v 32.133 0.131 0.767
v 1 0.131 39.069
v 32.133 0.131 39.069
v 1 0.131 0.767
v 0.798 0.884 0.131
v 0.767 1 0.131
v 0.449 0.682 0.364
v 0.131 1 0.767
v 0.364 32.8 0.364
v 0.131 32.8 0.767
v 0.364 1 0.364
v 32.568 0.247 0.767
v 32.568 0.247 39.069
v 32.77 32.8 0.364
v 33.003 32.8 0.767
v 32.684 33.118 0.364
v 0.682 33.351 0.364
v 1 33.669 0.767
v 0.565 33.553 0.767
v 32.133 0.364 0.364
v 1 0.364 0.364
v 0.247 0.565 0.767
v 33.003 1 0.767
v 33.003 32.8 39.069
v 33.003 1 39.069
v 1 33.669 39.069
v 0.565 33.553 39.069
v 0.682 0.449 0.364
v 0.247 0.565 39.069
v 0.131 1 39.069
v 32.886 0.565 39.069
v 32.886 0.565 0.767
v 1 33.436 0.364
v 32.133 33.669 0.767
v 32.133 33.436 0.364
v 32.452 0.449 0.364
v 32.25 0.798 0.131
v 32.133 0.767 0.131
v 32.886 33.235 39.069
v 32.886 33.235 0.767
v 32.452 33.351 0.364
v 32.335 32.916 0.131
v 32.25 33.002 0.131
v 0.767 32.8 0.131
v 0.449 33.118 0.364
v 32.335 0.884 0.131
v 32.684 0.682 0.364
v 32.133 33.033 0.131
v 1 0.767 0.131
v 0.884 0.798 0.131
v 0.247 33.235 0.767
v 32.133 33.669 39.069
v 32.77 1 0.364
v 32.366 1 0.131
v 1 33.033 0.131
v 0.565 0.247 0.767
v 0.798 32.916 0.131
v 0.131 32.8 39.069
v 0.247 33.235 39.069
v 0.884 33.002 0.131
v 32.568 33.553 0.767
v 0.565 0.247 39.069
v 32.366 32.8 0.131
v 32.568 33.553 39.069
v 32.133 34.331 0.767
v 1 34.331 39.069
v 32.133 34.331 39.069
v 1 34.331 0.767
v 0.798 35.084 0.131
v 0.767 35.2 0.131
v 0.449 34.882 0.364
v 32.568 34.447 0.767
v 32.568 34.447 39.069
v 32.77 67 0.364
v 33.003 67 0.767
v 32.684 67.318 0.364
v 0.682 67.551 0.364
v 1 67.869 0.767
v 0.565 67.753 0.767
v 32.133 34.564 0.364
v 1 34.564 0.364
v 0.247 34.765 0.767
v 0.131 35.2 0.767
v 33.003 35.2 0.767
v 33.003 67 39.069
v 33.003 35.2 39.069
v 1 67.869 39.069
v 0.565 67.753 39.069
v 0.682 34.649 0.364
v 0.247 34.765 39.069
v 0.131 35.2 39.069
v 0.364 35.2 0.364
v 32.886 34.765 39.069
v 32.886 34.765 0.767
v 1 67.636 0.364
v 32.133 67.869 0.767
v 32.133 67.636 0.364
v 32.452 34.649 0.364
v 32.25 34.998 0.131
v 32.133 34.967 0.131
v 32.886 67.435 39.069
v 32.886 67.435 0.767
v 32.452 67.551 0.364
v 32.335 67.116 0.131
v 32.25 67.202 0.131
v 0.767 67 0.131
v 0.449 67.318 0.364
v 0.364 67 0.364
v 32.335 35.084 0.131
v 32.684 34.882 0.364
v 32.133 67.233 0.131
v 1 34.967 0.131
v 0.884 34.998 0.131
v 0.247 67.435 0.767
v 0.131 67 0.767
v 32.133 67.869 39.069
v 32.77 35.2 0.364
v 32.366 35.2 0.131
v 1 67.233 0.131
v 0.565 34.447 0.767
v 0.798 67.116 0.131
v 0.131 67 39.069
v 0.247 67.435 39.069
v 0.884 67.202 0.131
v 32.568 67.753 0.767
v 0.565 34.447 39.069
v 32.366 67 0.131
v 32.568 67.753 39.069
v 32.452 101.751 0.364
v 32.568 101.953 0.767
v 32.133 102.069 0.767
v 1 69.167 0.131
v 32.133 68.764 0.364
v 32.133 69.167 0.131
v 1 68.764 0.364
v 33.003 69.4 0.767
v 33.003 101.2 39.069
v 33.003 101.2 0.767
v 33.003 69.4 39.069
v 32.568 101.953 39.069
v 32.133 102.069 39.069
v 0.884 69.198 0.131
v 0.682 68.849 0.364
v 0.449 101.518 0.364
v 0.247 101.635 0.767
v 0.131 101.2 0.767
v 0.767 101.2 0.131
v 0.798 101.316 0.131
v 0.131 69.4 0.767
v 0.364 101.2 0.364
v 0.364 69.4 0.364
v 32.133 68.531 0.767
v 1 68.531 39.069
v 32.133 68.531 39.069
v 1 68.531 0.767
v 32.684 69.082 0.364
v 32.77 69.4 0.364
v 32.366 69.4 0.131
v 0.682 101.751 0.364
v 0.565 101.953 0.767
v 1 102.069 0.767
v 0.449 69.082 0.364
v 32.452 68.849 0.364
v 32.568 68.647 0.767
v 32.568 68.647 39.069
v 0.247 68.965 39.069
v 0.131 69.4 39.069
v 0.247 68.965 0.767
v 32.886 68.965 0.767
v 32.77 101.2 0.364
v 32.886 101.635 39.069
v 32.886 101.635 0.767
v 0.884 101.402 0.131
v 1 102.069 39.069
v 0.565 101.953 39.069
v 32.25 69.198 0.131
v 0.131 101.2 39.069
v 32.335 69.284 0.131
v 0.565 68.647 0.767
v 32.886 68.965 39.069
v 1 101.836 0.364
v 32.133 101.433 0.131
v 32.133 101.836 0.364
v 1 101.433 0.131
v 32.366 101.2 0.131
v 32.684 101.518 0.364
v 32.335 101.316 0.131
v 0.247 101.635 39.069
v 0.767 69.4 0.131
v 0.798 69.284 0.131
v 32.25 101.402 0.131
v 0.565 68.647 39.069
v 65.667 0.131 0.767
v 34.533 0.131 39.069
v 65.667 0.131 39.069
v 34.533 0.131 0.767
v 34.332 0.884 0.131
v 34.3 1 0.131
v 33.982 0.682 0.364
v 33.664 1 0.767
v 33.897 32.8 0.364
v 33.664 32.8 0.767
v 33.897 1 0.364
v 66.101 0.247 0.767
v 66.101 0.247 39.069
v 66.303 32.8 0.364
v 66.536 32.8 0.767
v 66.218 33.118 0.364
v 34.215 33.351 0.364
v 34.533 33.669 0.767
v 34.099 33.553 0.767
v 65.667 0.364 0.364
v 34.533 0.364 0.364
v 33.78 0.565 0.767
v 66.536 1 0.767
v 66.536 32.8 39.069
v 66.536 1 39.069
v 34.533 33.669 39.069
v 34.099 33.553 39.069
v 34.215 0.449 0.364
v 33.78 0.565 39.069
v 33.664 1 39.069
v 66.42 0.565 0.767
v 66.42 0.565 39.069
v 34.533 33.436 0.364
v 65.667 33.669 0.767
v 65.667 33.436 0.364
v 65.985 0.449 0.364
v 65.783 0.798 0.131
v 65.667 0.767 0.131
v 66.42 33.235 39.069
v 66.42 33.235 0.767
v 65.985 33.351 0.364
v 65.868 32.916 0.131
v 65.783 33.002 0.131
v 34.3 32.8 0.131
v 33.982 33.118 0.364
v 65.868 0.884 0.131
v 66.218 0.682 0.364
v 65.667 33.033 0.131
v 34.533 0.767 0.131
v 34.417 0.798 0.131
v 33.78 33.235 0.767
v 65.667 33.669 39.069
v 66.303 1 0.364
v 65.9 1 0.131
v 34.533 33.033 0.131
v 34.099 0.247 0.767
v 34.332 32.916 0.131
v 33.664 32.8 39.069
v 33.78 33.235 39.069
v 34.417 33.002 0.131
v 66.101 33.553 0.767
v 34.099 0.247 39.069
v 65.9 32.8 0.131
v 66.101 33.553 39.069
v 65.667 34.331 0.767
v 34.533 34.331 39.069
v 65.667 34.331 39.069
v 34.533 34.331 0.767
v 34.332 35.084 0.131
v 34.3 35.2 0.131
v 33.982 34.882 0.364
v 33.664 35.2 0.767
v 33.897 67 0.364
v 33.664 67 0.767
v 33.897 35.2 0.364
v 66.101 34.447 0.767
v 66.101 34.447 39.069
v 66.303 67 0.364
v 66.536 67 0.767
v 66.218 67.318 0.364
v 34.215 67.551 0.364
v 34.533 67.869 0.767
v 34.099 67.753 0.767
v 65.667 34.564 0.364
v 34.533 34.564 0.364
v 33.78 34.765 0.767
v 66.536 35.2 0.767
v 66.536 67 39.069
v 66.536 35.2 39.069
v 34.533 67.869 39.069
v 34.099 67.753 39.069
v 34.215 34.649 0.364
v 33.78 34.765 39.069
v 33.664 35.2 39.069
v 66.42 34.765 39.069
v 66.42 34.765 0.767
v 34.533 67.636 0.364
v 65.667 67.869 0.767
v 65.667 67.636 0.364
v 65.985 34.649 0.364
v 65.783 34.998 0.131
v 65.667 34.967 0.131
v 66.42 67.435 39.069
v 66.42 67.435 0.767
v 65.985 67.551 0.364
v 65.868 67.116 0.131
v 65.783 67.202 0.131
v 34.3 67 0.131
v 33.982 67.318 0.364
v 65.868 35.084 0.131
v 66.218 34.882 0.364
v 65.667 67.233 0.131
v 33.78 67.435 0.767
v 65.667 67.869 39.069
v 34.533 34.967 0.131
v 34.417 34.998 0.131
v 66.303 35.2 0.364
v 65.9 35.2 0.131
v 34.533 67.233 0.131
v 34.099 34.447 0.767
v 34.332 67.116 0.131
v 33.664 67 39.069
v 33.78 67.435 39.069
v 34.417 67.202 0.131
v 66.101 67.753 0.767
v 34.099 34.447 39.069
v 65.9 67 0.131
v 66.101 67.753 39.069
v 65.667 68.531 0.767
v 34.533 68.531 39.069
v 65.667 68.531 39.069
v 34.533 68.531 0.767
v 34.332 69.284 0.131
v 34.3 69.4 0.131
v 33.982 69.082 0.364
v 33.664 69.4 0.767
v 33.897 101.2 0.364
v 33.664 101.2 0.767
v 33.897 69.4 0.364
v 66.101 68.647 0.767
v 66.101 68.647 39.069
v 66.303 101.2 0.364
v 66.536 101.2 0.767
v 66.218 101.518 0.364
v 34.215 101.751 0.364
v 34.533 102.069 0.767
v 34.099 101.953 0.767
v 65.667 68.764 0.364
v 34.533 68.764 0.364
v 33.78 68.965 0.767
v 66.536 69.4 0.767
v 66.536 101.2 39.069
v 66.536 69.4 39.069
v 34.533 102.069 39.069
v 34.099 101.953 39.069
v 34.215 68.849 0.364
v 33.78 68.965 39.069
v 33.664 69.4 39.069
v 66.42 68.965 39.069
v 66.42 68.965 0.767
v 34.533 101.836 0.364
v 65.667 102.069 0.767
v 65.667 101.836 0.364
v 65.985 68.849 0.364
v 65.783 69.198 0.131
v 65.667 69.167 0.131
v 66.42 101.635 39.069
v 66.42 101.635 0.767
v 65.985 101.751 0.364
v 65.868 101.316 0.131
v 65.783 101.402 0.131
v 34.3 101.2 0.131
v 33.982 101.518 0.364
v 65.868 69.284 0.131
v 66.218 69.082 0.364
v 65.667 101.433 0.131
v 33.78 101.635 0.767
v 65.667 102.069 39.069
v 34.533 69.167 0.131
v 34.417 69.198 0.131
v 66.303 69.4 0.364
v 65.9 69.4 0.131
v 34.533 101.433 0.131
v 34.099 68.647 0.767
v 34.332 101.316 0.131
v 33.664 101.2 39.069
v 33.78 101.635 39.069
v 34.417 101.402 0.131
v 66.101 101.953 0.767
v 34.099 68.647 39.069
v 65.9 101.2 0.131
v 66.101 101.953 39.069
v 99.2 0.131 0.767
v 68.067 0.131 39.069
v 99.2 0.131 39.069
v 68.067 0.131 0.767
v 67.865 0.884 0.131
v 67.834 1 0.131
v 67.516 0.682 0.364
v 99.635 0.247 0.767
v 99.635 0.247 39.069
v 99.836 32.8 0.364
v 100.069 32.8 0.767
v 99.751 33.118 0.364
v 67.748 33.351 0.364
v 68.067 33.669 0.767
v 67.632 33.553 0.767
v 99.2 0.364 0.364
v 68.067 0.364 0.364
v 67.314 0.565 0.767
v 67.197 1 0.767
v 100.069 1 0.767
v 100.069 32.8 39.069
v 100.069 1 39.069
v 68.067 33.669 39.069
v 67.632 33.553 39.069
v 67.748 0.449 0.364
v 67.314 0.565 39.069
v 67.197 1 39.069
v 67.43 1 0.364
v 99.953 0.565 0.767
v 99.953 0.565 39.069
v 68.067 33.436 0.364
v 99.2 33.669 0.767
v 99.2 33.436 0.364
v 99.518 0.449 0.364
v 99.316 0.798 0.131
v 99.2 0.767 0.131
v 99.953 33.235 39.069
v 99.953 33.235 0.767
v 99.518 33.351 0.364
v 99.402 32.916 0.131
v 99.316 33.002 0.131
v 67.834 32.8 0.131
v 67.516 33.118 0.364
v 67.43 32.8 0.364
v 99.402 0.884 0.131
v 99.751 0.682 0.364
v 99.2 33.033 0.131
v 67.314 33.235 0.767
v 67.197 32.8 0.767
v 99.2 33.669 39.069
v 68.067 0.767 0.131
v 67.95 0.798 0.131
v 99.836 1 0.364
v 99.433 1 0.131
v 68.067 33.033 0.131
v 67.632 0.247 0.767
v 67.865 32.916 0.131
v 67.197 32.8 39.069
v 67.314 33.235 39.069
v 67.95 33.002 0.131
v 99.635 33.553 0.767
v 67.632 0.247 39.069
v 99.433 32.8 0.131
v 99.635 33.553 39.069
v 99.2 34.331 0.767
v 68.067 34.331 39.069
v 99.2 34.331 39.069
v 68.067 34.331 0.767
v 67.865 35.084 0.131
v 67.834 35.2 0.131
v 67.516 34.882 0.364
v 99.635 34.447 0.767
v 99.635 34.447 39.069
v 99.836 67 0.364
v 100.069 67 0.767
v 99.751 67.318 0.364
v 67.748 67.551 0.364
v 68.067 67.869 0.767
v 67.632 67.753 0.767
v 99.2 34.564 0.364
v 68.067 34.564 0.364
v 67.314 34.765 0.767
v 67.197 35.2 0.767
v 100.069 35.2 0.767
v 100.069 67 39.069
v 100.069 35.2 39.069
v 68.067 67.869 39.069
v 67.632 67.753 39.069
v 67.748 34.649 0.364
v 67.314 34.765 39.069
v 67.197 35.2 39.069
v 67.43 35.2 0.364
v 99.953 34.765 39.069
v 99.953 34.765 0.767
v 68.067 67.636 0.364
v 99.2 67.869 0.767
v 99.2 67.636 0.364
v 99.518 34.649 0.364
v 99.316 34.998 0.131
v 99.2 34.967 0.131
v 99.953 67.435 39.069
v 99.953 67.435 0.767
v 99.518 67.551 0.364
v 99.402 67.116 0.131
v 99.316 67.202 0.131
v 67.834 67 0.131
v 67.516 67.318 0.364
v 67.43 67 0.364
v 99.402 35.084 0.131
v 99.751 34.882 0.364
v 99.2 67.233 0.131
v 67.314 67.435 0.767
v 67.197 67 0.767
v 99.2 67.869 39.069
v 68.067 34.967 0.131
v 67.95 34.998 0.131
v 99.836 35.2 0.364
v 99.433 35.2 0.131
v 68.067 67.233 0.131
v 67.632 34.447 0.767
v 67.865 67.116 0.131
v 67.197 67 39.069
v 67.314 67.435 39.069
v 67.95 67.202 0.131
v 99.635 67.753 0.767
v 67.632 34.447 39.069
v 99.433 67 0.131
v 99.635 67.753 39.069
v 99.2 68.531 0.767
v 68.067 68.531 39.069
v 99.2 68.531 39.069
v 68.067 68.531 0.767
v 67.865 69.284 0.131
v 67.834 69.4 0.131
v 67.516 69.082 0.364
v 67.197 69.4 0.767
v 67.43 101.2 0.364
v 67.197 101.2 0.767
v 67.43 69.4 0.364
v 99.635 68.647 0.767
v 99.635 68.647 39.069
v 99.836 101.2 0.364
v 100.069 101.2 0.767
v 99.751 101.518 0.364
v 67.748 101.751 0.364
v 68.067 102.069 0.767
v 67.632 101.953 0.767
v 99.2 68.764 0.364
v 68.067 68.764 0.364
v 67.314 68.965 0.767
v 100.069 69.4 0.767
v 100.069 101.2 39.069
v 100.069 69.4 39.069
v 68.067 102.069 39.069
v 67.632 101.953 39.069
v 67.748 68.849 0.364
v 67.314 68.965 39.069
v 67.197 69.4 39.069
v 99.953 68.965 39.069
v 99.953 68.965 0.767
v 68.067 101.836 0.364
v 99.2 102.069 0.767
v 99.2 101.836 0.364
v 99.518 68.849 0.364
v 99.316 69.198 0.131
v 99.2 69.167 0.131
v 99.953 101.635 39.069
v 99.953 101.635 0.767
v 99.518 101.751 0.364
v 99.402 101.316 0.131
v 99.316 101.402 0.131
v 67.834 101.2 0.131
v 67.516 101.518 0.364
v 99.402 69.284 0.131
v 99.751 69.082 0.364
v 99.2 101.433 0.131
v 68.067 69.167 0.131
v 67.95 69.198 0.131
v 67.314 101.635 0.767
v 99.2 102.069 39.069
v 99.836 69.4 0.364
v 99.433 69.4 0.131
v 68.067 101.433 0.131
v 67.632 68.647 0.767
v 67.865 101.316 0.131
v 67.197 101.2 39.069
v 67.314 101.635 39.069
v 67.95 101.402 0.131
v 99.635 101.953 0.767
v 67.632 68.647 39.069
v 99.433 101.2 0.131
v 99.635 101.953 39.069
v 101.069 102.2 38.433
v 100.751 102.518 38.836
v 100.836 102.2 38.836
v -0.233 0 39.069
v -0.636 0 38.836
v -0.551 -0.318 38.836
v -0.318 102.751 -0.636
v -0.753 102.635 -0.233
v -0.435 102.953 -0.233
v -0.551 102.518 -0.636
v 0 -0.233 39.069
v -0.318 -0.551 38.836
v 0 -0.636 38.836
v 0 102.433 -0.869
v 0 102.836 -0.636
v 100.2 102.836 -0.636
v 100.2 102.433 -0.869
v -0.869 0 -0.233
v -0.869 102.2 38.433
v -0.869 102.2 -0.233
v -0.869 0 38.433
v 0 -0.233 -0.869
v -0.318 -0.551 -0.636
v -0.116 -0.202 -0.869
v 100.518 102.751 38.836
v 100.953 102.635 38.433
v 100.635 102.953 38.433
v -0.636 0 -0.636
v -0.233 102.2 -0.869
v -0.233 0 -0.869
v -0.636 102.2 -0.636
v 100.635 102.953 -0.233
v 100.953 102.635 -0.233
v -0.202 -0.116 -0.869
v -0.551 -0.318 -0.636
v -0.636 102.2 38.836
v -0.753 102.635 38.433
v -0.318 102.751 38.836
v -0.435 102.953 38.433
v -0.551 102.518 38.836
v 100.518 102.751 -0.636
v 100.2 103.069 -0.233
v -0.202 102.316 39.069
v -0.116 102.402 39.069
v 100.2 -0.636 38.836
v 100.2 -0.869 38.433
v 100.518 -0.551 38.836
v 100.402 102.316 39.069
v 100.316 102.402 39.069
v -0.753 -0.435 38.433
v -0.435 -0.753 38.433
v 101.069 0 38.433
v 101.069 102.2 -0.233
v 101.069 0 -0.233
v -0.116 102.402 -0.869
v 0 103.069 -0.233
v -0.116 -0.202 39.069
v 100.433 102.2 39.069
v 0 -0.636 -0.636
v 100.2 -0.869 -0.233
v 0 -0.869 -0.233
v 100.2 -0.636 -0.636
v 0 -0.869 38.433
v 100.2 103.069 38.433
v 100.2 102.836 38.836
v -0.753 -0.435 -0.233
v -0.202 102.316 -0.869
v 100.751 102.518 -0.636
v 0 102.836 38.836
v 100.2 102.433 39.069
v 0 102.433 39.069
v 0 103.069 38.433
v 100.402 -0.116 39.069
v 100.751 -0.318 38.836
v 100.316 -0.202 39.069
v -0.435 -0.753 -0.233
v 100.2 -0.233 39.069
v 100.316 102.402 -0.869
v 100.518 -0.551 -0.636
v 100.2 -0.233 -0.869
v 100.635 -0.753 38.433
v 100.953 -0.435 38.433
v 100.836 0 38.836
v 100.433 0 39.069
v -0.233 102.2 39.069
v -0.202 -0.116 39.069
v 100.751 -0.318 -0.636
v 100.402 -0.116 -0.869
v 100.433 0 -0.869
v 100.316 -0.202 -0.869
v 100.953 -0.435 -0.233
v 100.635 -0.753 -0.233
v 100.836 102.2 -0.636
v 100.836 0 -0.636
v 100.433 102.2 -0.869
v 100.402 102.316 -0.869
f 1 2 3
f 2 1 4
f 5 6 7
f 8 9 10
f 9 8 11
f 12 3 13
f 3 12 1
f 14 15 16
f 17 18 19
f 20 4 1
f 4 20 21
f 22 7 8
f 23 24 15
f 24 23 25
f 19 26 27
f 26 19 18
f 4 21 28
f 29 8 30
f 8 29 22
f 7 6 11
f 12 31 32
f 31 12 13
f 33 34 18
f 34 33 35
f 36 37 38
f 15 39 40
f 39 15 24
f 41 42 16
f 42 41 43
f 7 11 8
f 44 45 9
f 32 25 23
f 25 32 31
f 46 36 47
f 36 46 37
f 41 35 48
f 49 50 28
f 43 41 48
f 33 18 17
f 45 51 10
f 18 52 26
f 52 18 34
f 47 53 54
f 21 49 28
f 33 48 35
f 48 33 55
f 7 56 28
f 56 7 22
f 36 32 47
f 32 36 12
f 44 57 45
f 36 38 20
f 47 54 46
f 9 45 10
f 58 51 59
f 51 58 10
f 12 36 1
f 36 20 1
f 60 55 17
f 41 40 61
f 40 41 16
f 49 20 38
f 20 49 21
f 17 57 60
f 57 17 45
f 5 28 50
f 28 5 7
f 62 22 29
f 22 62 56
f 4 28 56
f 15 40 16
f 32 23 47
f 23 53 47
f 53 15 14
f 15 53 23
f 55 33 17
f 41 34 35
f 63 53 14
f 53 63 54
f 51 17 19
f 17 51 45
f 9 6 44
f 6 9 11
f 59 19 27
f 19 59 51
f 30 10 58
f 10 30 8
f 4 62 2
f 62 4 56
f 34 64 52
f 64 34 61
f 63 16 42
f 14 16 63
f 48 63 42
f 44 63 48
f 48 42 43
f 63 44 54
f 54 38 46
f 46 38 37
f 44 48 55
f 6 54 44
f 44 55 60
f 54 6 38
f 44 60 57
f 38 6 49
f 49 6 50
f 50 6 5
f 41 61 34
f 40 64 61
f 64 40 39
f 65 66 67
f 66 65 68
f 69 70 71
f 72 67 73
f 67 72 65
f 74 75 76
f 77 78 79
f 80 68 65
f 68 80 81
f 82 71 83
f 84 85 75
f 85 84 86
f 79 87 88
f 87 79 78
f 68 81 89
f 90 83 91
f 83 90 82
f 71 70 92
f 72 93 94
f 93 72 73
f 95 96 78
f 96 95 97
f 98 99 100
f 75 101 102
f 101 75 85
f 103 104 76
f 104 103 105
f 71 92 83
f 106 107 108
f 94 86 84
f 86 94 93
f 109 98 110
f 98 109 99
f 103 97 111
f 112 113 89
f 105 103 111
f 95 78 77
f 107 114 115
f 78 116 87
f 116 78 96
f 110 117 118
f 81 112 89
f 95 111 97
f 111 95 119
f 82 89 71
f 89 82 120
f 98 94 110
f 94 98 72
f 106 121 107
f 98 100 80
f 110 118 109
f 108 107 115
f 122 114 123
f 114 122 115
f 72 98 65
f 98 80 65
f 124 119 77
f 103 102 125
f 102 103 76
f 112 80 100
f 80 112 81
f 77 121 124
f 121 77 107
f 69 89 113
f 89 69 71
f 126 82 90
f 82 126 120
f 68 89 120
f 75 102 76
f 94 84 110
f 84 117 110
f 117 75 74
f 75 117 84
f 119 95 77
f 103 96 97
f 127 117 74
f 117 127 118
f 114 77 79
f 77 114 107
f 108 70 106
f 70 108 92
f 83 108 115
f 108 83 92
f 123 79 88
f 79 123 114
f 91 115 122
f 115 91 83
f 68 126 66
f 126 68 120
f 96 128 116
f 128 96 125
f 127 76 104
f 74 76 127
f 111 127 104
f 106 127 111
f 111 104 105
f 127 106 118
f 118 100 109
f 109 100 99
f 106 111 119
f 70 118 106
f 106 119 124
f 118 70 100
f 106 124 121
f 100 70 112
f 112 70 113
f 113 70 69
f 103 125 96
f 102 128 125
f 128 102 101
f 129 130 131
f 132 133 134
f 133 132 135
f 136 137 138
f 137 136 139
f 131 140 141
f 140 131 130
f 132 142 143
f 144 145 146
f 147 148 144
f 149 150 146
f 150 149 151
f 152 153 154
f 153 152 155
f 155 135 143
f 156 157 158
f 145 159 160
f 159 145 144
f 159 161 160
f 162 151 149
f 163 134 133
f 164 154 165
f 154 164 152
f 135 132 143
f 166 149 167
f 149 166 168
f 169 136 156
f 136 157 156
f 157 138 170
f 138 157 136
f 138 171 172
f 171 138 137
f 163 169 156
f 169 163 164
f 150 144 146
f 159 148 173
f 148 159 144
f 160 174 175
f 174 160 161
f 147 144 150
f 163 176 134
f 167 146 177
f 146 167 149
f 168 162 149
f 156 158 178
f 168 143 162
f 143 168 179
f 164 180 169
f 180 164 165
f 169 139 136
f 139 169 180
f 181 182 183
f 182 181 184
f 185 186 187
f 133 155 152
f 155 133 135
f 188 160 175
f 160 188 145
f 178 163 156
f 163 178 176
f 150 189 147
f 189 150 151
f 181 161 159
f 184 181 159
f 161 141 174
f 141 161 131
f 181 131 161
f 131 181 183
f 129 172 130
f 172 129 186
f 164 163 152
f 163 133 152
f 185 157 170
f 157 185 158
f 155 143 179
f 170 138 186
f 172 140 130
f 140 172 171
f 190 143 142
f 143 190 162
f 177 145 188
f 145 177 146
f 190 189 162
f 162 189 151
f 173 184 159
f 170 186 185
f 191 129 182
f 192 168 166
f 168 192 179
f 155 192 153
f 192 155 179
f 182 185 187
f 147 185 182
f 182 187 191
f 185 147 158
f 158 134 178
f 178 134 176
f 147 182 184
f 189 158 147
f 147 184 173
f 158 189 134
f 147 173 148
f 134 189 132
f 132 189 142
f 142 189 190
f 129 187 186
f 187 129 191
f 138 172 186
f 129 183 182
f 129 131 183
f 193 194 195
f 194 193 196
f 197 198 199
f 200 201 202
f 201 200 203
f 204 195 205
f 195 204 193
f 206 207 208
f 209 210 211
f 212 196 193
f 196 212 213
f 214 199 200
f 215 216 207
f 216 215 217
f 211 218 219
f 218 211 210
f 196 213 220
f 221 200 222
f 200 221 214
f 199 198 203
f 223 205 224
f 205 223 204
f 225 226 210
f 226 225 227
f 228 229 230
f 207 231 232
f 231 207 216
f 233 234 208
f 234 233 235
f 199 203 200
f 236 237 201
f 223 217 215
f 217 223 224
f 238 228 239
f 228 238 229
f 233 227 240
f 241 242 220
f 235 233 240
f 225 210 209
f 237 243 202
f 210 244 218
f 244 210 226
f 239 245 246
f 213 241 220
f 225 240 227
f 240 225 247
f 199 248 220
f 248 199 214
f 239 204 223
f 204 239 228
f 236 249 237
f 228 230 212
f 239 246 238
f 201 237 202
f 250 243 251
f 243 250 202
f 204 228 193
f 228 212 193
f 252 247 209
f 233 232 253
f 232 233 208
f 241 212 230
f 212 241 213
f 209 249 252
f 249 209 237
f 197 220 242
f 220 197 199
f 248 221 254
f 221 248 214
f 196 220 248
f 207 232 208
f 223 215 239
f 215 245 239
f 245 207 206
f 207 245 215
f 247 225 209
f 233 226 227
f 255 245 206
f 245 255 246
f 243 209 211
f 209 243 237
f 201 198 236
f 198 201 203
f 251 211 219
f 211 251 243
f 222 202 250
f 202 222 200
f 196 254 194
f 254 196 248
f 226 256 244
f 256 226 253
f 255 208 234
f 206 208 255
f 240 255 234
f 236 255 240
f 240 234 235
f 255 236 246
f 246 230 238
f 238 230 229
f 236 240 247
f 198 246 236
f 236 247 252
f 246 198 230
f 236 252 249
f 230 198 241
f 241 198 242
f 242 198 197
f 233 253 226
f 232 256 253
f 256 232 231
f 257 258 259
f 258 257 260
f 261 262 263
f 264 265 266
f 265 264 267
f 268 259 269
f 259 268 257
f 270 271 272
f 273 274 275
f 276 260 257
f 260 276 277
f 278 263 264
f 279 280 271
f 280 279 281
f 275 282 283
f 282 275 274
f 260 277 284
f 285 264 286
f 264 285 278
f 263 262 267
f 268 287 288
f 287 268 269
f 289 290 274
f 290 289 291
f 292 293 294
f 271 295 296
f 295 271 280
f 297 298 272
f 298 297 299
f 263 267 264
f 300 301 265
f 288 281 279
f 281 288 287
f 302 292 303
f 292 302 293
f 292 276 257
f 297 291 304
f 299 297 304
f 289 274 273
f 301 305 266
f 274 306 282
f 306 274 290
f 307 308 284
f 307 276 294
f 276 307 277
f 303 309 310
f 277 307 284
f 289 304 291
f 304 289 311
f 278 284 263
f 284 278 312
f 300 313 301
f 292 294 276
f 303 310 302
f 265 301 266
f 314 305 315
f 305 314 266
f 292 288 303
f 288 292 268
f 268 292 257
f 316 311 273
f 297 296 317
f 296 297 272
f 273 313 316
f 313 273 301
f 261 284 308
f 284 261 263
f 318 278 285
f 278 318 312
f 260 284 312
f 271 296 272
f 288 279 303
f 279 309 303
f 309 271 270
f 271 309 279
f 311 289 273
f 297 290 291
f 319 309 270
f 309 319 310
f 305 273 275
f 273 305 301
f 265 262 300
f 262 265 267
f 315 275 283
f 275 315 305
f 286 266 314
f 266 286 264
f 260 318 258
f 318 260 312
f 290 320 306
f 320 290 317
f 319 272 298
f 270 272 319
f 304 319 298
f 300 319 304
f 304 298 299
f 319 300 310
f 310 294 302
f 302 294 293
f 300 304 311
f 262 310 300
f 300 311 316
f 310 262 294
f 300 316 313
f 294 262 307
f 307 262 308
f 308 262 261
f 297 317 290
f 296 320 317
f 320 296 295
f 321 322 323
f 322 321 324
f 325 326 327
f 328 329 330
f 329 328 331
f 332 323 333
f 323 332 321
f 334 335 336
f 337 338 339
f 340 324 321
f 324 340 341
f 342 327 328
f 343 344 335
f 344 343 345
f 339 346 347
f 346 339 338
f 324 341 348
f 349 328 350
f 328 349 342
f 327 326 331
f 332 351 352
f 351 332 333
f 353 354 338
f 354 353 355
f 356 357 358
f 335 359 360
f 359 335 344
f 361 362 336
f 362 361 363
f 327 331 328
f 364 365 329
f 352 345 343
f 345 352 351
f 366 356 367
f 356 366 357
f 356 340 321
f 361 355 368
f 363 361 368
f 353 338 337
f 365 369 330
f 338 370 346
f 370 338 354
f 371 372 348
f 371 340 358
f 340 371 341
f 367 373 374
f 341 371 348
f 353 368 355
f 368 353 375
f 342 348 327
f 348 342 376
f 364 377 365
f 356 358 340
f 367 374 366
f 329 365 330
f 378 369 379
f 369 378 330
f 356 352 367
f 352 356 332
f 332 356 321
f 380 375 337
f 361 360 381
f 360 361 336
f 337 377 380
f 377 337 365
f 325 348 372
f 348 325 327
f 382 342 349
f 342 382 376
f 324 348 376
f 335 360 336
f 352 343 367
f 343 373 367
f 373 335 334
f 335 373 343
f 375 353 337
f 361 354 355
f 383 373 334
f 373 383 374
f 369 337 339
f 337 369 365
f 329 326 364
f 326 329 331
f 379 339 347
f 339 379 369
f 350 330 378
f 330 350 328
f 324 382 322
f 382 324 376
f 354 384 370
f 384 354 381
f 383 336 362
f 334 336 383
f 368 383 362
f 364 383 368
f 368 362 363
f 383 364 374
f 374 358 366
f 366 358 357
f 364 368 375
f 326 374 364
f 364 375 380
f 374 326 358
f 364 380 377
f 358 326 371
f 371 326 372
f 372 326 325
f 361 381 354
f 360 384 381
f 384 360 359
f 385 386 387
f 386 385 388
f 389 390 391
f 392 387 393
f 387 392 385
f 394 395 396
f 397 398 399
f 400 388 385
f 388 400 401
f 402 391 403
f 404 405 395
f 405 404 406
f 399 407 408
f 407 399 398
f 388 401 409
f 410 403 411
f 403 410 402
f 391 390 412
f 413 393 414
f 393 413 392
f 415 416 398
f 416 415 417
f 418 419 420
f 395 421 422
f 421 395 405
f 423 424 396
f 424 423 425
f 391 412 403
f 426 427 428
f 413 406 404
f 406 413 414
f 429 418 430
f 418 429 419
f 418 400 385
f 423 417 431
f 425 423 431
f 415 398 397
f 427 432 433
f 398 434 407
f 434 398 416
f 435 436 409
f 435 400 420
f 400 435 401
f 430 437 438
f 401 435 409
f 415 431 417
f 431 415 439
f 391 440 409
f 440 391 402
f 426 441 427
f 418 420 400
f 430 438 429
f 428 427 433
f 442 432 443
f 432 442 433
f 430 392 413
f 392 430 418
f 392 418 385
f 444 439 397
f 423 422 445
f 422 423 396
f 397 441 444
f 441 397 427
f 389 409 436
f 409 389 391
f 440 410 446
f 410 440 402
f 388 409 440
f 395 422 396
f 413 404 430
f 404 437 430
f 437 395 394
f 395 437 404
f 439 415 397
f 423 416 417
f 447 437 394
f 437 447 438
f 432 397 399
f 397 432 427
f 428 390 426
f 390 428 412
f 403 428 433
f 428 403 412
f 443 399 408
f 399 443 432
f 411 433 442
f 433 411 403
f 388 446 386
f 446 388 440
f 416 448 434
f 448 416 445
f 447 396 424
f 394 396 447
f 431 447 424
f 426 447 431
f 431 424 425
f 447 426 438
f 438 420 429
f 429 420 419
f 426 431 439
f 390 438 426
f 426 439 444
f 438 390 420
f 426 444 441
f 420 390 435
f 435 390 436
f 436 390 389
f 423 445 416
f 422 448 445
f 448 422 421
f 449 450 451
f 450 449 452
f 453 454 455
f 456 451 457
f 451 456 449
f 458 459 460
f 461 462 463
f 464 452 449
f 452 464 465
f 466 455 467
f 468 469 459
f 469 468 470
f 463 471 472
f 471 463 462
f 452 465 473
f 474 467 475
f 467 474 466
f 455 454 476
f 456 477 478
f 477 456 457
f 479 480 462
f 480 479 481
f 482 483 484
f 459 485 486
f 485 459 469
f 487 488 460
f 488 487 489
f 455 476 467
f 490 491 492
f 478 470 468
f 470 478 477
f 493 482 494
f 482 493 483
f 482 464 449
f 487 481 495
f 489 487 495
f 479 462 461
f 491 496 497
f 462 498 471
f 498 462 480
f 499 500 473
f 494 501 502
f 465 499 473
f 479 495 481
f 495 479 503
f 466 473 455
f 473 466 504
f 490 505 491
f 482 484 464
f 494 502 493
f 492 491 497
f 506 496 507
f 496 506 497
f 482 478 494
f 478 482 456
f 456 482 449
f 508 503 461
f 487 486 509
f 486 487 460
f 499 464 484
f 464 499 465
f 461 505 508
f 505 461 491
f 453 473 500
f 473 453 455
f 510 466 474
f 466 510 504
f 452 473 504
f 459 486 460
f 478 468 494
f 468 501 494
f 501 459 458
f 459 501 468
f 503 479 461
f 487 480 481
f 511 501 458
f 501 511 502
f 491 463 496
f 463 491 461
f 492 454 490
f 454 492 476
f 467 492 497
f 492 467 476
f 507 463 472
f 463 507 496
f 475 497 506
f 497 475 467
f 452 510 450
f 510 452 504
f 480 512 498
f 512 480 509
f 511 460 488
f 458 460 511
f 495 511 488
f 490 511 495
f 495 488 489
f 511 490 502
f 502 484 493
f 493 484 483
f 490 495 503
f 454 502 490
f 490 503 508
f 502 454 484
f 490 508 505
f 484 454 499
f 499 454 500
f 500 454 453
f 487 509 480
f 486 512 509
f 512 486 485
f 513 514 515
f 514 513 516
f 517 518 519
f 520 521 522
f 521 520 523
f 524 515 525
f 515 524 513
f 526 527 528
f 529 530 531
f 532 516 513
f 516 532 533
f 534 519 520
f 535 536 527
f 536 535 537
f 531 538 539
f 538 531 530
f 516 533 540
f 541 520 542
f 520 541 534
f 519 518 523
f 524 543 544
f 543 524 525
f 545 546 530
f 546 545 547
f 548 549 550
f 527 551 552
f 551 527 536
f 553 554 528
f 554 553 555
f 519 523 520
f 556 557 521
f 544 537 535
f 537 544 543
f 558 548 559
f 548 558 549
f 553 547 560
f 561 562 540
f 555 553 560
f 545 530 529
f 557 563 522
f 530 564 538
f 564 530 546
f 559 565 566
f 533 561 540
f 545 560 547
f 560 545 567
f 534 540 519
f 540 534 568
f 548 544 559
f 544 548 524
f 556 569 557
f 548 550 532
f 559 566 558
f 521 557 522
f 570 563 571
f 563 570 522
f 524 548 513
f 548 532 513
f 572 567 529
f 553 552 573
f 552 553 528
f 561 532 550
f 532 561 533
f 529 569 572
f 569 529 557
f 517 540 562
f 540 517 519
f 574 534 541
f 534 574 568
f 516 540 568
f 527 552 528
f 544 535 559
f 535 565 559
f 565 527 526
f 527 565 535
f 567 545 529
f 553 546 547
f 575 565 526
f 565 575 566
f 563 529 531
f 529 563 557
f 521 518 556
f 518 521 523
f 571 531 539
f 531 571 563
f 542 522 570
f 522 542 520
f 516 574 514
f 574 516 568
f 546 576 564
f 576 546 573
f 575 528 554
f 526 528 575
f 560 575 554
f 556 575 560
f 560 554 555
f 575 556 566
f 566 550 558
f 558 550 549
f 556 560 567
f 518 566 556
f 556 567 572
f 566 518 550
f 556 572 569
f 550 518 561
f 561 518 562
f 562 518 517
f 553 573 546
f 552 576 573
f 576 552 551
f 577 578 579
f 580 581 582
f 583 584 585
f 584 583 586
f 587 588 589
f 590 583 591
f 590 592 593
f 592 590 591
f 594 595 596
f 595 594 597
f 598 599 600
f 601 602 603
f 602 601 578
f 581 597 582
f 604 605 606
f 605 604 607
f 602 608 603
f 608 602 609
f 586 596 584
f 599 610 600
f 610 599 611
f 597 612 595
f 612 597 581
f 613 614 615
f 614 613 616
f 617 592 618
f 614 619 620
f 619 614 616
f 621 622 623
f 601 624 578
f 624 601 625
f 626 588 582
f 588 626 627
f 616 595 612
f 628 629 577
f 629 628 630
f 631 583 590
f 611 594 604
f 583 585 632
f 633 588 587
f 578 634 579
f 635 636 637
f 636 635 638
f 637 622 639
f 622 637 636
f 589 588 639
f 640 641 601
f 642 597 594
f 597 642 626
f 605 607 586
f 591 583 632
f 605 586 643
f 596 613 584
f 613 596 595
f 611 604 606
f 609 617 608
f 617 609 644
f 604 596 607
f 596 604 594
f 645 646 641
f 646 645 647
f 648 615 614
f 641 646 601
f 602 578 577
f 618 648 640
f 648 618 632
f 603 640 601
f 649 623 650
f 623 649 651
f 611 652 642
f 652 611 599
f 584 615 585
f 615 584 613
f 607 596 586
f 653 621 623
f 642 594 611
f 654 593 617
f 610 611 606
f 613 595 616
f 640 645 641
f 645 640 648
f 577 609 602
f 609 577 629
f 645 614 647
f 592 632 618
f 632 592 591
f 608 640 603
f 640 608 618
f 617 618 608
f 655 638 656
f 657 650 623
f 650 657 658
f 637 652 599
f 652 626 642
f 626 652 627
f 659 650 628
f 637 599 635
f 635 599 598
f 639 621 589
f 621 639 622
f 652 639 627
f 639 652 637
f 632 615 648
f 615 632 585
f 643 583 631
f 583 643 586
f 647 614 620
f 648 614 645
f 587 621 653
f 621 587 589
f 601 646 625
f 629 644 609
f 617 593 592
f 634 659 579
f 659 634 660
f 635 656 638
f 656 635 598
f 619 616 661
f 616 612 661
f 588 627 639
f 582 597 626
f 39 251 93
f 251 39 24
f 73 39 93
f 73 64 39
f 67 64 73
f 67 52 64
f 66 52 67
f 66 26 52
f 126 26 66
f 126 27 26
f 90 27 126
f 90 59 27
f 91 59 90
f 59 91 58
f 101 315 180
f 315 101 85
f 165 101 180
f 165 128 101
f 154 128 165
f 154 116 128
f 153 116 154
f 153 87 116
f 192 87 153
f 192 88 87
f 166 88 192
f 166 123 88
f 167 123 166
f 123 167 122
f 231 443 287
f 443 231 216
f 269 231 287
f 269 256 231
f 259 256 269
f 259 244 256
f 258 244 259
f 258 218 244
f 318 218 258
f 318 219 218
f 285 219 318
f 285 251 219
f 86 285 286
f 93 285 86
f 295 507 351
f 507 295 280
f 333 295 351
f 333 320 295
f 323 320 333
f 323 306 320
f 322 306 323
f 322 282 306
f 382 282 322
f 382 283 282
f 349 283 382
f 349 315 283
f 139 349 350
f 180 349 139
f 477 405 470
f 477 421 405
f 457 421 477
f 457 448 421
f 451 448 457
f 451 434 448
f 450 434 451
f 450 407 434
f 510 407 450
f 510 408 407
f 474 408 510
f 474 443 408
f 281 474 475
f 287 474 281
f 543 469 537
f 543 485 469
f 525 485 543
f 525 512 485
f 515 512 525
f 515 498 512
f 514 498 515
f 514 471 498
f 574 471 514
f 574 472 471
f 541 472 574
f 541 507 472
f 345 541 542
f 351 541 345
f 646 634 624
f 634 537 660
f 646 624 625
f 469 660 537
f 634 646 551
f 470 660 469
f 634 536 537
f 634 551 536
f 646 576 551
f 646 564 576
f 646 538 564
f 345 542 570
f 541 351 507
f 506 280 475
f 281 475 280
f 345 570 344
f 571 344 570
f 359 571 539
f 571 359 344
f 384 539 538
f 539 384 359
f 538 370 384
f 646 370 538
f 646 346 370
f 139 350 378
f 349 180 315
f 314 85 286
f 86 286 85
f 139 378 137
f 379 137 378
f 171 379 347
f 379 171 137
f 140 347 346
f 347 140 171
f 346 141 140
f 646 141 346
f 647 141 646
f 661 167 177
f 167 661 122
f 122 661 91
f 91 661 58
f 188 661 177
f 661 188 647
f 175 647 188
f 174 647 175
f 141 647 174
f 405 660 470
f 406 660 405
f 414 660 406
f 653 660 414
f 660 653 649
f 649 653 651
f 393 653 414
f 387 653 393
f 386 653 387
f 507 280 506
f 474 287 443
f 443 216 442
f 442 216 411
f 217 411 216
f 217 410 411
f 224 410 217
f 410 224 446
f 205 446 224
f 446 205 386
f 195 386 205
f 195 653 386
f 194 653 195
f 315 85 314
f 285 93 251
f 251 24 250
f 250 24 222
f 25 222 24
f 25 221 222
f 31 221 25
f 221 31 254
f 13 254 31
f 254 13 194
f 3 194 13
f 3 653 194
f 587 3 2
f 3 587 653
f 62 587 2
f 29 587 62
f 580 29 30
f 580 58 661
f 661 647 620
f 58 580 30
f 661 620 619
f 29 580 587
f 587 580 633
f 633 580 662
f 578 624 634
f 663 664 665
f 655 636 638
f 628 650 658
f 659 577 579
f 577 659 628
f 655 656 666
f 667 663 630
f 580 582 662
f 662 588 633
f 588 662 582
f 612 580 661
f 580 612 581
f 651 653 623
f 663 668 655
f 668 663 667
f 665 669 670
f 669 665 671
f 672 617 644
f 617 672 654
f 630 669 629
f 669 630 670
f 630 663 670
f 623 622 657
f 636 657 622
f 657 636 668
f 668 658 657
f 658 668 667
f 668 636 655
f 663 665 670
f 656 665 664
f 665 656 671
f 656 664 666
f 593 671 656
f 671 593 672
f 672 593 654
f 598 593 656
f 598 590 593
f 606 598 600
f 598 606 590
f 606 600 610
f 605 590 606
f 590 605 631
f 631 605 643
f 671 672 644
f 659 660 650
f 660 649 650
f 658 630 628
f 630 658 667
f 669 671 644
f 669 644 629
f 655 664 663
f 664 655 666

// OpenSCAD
/////////////////Parameters
/* [Sizes] */
// total width
tw =102;
// total length
tl = 104;
// height
owh = 40;
// boxes in width direction
nw=3; // [1:10]
// boxes in length direction
nl=3; // [1:10]
// outer wall width
oww = 1;
// inner wall width 
iww = 0.6;
// edge radius
r = 0.9;
/* [Hidden] */
$fn=12;
//drawing

if (r<=0) {
	boxes(nw,nl,oww,iww,owh,(tw-2*oww+iww)/nw,(tl-2*oww+iww)/nl);
} else {
	rboxes(nw,nl,oww,iww,owh,(tw-2*oww+iww)/nw,(tl-2*oww+iww)/nl,r);
}

//////////////////Calculations + modules

module boxes(nbw,nbl,ow,iw,oh,boxw,boxl) {
	difference() {
		cube([nbw*boxw+ow+ow-iw,nbl*boxl+ow+ow-iw,oh]);
		for (i=[0:nbw-1])
			for (j=[0:nbl-1])
				translate([i*boxw+ow,j*boxl+ow,ow])
					cube([boxw-iw,boxl-iw,oh]);
	}
}

module rboxes(nbw,nbl,ow,iw,oh,boxw,boxl,r) {
	difference() {
		rcube(nbw*boxw+ow+ow-iw,nbl*boxl+ow+ow-iw,oh,r);
		for (i=[0:nbw-1])
			for (j=[0:nbl-1])
				translate([i*boxw+ow,j*boxl+ow,ow])
					rcube(boxw-iw,boxl-iw,oh,r);
	}
}

module rcube(w,l,h,r) {
	minkowski(){
		cube([w-2*r,l-2*r,h-2*r]);
		sphere(r);
	}	
}
